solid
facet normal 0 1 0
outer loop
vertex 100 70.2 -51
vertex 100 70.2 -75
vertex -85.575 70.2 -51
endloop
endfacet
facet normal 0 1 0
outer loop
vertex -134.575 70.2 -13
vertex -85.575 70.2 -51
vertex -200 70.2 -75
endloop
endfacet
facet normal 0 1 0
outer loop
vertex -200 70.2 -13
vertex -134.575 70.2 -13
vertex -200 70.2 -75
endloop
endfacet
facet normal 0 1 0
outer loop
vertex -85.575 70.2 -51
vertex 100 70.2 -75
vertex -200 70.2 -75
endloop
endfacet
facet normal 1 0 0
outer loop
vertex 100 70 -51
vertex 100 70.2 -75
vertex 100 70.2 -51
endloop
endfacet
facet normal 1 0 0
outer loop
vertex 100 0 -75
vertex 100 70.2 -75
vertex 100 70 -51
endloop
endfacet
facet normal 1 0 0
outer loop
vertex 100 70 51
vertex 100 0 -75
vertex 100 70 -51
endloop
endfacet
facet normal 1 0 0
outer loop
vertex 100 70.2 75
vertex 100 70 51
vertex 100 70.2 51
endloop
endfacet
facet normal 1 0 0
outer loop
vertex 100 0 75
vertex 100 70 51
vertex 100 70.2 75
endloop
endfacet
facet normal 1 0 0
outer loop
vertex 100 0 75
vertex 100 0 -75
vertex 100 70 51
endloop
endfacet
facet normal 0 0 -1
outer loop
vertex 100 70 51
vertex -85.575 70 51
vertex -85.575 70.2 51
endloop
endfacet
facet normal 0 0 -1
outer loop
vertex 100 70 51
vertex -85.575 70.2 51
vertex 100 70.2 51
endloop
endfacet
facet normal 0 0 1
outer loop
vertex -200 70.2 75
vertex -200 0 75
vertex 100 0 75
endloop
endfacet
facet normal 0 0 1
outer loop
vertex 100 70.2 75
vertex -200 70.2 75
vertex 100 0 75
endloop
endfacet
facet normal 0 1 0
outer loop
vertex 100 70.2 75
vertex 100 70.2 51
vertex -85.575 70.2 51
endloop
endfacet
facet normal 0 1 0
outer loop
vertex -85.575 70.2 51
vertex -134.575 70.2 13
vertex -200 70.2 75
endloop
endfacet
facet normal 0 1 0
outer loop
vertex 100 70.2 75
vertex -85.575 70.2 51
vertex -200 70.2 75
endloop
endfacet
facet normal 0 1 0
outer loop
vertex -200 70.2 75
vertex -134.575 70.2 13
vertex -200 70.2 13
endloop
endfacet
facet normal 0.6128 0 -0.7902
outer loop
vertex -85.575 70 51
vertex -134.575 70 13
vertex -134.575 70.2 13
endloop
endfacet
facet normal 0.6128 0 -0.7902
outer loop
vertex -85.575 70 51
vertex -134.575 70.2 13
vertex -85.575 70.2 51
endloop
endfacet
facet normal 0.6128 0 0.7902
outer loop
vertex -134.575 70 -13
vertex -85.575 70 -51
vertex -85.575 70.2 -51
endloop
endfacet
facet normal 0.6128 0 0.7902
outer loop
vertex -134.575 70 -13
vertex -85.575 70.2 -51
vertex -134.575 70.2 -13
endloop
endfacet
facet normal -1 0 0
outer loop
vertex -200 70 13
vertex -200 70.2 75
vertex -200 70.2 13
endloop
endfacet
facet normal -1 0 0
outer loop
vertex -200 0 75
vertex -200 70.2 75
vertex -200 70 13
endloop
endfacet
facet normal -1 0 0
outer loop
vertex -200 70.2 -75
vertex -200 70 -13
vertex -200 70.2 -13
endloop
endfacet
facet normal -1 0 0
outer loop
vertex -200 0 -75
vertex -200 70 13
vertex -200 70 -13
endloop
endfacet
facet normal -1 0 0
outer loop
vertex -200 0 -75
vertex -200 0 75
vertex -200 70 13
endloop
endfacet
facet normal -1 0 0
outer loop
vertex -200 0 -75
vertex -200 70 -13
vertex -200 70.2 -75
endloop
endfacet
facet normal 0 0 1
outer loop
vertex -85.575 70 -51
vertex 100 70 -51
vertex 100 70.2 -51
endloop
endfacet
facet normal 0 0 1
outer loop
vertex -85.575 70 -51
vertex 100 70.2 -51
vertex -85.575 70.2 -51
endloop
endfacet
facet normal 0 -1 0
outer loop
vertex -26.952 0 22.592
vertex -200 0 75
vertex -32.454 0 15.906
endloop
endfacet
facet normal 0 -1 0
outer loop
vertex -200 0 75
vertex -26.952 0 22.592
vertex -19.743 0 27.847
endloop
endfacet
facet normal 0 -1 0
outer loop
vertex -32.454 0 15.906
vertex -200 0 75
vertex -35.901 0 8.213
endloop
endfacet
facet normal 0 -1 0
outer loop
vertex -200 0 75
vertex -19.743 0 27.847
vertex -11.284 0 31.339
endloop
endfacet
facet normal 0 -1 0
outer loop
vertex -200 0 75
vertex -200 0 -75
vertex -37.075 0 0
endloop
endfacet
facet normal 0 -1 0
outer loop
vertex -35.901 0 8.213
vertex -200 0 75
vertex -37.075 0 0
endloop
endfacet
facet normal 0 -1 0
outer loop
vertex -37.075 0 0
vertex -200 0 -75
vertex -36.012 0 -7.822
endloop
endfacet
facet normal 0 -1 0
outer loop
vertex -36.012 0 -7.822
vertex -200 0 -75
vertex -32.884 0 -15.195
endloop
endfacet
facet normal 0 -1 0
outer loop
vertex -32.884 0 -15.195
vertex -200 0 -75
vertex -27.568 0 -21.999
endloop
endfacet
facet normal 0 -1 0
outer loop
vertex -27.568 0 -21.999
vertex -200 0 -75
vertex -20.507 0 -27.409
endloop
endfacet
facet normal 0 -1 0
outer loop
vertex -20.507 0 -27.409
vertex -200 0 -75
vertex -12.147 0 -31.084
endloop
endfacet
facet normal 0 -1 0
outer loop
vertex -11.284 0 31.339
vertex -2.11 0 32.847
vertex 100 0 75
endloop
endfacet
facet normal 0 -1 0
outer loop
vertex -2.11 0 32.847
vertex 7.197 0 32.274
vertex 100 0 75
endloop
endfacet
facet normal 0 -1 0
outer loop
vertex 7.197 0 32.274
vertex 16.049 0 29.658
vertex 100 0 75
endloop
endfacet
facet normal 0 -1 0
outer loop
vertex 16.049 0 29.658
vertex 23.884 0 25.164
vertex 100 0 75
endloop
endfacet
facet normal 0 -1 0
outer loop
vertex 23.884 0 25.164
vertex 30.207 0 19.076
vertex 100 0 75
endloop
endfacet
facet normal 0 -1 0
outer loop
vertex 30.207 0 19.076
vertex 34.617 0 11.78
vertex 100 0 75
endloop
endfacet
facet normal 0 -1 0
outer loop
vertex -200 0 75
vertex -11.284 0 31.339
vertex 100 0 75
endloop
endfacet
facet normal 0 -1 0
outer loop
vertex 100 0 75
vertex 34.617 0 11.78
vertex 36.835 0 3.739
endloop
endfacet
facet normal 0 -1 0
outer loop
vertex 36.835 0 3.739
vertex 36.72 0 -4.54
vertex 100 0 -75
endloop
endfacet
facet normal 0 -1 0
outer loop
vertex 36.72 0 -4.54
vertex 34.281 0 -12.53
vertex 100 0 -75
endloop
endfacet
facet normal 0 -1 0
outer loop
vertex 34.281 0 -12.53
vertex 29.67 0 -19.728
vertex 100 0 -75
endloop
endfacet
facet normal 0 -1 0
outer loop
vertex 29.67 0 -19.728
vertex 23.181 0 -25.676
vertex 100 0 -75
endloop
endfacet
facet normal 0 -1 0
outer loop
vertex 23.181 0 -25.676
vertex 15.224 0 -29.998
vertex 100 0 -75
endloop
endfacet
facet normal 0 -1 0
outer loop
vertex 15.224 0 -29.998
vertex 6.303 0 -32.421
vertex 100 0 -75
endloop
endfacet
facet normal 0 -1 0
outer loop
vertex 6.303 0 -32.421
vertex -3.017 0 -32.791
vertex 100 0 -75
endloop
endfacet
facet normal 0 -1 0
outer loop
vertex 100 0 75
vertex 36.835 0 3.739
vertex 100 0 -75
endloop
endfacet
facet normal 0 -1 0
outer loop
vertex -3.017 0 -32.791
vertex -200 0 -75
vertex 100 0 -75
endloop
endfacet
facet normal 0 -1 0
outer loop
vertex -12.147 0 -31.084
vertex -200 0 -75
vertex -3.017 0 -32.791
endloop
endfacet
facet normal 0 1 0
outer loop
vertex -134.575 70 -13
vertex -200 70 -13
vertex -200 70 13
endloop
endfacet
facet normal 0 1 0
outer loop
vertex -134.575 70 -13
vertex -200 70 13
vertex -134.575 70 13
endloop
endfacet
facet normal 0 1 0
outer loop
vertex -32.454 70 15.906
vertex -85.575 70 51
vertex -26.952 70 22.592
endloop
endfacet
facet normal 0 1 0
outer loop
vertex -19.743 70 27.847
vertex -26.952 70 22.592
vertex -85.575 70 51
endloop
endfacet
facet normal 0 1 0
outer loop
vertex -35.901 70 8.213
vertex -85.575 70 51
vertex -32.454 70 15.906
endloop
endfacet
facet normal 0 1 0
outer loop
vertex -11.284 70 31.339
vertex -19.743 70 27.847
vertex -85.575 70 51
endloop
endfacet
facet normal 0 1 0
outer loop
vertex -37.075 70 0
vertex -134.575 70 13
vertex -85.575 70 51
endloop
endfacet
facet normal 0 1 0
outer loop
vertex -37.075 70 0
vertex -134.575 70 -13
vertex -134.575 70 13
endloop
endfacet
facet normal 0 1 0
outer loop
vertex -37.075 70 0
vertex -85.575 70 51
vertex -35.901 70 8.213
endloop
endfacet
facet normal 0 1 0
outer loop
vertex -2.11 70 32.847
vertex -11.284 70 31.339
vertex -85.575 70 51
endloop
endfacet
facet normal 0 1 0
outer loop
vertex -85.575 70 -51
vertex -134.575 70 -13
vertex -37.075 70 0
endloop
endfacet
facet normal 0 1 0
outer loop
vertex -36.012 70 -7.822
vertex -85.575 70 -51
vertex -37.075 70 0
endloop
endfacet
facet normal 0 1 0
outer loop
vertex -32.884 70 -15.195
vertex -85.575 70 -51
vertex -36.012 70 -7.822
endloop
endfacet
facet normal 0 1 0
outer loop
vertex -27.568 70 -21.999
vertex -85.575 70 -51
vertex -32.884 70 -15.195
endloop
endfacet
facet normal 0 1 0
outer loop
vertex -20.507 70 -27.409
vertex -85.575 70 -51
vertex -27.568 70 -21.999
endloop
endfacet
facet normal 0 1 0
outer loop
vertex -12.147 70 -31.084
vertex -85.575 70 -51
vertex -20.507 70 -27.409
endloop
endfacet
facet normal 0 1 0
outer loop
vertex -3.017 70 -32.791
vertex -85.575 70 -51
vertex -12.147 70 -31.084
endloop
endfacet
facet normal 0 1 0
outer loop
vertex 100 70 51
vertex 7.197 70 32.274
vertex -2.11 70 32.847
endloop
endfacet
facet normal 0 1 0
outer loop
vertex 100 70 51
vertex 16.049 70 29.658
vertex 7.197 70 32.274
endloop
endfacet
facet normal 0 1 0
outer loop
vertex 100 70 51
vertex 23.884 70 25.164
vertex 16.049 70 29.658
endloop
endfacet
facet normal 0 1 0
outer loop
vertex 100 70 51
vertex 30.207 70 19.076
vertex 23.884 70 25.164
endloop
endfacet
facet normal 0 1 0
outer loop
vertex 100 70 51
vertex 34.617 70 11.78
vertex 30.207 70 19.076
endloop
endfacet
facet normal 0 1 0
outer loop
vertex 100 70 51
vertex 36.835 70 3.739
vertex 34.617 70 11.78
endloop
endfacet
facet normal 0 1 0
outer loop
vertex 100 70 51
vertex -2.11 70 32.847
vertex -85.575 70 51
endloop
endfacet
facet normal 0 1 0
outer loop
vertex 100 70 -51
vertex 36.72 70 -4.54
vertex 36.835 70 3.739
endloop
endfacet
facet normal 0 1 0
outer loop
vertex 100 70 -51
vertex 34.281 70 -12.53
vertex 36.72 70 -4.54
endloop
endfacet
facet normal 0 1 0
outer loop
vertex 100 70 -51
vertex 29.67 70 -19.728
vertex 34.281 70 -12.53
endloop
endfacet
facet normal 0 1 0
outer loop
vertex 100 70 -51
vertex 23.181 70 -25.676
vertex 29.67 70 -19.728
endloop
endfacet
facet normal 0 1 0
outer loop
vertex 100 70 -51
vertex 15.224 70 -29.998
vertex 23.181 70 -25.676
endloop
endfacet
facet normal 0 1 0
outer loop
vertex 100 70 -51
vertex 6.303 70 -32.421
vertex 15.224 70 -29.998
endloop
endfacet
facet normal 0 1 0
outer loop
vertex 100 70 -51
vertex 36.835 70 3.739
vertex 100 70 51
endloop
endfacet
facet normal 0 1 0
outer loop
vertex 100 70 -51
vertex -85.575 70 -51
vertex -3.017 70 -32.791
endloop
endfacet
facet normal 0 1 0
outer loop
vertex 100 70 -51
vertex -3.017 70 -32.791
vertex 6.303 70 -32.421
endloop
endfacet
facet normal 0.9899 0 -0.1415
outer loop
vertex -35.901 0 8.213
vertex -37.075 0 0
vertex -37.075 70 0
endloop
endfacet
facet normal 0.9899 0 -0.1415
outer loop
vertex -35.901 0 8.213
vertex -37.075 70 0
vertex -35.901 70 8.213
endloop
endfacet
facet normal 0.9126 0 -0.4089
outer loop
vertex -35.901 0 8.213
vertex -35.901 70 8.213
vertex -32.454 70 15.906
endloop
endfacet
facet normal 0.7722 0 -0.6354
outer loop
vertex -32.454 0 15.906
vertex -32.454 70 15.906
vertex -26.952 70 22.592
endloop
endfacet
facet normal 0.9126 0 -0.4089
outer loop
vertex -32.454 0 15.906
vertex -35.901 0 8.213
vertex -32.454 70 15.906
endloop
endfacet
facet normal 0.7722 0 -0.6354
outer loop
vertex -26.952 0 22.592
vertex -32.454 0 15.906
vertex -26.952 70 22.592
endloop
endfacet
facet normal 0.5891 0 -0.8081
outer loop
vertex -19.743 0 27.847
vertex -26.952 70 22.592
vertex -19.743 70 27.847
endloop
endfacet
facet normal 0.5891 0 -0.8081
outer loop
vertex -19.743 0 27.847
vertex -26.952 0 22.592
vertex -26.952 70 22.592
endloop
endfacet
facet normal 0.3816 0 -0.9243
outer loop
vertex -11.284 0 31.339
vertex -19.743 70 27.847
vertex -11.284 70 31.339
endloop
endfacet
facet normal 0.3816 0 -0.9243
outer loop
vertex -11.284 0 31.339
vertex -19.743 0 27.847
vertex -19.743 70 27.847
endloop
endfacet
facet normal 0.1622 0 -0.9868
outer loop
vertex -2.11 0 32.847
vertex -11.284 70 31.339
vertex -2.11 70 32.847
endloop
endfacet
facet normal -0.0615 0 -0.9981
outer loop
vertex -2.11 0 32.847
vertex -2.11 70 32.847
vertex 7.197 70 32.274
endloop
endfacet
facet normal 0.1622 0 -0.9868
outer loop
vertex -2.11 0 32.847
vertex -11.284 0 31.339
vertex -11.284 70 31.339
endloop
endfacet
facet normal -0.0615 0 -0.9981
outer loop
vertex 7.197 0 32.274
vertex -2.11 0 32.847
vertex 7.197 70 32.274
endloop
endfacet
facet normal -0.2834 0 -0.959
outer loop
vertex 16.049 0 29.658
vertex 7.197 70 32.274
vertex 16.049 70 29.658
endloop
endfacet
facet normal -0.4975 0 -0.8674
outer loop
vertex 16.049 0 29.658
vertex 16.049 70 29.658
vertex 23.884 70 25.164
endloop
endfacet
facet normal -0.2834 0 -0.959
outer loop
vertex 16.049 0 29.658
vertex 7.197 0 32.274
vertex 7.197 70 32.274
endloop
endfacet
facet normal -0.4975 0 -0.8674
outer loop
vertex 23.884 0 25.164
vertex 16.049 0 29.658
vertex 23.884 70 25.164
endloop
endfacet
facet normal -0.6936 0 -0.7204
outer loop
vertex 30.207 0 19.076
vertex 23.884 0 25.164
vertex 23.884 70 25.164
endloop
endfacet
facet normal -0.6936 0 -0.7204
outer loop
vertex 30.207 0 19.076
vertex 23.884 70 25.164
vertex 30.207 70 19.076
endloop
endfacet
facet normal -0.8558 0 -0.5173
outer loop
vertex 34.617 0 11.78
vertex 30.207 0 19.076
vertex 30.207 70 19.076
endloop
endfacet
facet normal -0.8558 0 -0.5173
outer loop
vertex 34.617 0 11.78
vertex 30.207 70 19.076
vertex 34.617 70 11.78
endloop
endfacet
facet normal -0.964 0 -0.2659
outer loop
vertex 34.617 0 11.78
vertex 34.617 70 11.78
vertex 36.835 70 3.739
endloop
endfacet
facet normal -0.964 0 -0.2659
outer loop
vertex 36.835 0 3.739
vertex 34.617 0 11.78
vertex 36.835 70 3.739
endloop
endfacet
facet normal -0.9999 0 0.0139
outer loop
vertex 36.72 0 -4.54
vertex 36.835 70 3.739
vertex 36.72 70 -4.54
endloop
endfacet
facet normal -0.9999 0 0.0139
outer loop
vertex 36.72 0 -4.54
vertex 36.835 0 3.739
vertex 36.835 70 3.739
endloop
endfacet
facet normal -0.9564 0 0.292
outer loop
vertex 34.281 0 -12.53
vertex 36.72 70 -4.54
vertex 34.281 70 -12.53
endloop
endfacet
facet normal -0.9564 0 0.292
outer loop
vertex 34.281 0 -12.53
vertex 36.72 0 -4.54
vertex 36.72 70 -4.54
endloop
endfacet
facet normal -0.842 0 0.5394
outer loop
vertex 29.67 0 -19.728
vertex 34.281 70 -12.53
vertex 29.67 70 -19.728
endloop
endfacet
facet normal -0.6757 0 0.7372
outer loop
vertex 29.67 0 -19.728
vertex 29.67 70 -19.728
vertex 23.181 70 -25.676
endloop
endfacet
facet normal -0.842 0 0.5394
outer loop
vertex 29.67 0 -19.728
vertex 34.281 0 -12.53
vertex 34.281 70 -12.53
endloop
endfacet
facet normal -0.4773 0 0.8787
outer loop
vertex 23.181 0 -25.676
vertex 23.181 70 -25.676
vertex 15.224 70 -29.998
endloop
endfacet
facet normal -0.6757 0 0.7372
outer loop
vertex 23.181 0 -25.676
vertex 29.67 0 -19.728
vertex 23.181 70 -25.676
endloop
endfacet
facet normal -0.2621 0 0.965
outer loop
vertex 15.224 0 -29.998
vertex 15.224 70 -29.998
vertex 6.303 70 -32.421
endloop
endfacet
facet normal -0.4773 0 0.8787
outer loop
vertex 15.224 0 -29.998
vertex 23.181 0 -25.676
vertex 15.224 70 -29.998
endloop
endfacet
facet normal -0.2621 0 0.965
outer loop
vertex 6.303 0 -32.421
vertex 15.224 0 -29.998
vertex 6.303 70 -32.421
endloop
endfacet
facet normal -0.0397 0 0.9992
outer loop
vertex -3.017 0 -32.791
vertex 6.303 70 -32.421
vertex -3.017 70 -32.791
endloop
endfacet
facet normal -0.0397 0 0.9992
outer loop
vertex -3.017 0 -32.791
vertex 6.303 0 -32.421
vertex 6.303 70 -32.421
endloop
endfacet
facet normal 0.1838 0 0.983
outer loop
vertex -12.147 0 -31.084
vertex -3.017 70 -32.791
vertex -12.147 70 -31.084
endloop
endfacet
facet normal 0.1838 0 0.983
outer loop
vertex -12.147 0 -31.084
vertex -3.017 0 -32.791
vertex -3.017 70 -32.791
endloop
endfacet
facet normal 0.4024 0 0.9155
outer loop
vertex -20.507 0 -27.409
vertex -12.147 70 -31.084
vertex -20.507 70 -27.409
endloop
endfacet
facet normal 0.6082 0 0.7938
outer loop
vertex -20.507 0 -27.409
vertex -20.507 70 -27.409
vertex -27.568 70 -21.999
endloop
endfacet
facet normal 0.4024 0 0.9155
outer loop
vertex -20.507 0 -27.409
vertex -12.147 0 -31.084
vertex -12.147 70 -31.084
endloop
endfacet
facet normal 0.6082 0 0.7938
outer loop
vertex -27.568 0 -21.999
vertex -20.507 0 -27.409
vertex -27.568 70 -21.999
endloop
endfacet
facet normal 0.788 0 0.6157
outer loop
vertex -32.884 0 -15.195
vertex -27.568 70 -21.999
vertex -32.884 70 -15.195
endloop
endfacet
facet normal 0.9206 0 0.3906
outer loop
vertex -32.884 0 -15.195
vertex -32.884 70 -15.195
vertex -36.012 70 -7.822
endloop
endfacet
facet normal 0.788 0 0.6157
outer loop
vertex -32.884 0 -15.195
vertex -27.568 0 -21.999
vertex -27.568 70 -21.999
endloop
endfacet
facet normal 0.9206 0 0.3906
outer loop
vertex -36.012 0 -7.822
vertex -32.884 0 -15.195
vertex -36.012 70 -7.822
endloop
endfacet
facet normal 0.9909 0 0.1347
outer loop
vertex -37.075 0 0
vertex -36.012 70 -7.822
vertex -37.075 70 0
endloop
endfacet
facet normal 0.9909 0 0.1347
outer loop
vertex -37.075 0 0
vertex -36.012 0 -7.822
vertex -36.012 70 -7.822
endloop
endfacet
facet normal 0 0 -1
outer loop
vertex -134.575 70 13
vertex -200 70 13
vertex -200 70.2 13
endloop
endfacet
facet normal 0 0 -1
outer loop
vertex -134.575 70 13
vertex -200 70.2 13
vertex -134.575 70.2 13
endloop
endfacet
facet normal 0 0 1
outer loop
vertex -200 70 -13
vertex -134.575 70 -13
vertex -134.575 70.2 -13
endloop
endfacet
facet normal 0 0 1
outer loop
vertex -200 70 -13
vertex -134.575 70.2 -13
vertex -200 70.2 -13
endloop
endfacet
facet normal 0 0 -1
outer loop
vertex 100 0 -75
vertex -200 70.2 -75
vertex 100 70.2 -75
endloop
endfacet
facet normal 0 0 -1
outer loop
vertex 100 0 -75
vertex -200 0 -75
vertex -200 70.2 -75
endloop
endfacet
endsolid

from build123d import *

# Parameters (mm, degrees)
SKETCH1_W           = 300
SKETCH1_H           = 150
SKETCH1_RX          = 37.075
SKETCH1_RY          = 32.9
BOSS_EXTRUDE1_DEPTH = 70
BOSS_EXTRUDE2_DEPTH = 0.2


with BuildPart() as part:
    # Sketch1 → Boss-Extrude1 (new body)
    with BuildSketch(Plane(origin=(0, 0, 0), x_dir=(1, 0, 0), z_dir=(0, 1, 0))):
        with Locations((-50, 0)):
            Rectangle(SKETCH1_W, SKETCH1_H)
        with Locations(Location((0, 0), (0, 0, 180))):
            Ellipse(SKETCH1_RX, SKETCH1_RY, mode=Mode.SUBTRACT)
    extrude(amount=BOSS_EXTRUDE1_DEPTH)

    # Sketch2 → Boss-Extrude2 (add)
    with BuildSketch(Plane(origin=(0, 70, 0), x_dir=(1, 0, 0), z_dir=(0, 1, 0))):
        Polygon((100, 51), (-85.575, 51), (-134.575, 13), (-200, 13), (-200, 75), (100, 75), align=None)
        Polygon((-200, -13), (-134.575, -13), (-85.575, -51), (100, -51), (100, -75), (-200, -75), align=None)
    extrude(amount=BOSS_EXTRUDE2_DEPTH)


solid = part.part
